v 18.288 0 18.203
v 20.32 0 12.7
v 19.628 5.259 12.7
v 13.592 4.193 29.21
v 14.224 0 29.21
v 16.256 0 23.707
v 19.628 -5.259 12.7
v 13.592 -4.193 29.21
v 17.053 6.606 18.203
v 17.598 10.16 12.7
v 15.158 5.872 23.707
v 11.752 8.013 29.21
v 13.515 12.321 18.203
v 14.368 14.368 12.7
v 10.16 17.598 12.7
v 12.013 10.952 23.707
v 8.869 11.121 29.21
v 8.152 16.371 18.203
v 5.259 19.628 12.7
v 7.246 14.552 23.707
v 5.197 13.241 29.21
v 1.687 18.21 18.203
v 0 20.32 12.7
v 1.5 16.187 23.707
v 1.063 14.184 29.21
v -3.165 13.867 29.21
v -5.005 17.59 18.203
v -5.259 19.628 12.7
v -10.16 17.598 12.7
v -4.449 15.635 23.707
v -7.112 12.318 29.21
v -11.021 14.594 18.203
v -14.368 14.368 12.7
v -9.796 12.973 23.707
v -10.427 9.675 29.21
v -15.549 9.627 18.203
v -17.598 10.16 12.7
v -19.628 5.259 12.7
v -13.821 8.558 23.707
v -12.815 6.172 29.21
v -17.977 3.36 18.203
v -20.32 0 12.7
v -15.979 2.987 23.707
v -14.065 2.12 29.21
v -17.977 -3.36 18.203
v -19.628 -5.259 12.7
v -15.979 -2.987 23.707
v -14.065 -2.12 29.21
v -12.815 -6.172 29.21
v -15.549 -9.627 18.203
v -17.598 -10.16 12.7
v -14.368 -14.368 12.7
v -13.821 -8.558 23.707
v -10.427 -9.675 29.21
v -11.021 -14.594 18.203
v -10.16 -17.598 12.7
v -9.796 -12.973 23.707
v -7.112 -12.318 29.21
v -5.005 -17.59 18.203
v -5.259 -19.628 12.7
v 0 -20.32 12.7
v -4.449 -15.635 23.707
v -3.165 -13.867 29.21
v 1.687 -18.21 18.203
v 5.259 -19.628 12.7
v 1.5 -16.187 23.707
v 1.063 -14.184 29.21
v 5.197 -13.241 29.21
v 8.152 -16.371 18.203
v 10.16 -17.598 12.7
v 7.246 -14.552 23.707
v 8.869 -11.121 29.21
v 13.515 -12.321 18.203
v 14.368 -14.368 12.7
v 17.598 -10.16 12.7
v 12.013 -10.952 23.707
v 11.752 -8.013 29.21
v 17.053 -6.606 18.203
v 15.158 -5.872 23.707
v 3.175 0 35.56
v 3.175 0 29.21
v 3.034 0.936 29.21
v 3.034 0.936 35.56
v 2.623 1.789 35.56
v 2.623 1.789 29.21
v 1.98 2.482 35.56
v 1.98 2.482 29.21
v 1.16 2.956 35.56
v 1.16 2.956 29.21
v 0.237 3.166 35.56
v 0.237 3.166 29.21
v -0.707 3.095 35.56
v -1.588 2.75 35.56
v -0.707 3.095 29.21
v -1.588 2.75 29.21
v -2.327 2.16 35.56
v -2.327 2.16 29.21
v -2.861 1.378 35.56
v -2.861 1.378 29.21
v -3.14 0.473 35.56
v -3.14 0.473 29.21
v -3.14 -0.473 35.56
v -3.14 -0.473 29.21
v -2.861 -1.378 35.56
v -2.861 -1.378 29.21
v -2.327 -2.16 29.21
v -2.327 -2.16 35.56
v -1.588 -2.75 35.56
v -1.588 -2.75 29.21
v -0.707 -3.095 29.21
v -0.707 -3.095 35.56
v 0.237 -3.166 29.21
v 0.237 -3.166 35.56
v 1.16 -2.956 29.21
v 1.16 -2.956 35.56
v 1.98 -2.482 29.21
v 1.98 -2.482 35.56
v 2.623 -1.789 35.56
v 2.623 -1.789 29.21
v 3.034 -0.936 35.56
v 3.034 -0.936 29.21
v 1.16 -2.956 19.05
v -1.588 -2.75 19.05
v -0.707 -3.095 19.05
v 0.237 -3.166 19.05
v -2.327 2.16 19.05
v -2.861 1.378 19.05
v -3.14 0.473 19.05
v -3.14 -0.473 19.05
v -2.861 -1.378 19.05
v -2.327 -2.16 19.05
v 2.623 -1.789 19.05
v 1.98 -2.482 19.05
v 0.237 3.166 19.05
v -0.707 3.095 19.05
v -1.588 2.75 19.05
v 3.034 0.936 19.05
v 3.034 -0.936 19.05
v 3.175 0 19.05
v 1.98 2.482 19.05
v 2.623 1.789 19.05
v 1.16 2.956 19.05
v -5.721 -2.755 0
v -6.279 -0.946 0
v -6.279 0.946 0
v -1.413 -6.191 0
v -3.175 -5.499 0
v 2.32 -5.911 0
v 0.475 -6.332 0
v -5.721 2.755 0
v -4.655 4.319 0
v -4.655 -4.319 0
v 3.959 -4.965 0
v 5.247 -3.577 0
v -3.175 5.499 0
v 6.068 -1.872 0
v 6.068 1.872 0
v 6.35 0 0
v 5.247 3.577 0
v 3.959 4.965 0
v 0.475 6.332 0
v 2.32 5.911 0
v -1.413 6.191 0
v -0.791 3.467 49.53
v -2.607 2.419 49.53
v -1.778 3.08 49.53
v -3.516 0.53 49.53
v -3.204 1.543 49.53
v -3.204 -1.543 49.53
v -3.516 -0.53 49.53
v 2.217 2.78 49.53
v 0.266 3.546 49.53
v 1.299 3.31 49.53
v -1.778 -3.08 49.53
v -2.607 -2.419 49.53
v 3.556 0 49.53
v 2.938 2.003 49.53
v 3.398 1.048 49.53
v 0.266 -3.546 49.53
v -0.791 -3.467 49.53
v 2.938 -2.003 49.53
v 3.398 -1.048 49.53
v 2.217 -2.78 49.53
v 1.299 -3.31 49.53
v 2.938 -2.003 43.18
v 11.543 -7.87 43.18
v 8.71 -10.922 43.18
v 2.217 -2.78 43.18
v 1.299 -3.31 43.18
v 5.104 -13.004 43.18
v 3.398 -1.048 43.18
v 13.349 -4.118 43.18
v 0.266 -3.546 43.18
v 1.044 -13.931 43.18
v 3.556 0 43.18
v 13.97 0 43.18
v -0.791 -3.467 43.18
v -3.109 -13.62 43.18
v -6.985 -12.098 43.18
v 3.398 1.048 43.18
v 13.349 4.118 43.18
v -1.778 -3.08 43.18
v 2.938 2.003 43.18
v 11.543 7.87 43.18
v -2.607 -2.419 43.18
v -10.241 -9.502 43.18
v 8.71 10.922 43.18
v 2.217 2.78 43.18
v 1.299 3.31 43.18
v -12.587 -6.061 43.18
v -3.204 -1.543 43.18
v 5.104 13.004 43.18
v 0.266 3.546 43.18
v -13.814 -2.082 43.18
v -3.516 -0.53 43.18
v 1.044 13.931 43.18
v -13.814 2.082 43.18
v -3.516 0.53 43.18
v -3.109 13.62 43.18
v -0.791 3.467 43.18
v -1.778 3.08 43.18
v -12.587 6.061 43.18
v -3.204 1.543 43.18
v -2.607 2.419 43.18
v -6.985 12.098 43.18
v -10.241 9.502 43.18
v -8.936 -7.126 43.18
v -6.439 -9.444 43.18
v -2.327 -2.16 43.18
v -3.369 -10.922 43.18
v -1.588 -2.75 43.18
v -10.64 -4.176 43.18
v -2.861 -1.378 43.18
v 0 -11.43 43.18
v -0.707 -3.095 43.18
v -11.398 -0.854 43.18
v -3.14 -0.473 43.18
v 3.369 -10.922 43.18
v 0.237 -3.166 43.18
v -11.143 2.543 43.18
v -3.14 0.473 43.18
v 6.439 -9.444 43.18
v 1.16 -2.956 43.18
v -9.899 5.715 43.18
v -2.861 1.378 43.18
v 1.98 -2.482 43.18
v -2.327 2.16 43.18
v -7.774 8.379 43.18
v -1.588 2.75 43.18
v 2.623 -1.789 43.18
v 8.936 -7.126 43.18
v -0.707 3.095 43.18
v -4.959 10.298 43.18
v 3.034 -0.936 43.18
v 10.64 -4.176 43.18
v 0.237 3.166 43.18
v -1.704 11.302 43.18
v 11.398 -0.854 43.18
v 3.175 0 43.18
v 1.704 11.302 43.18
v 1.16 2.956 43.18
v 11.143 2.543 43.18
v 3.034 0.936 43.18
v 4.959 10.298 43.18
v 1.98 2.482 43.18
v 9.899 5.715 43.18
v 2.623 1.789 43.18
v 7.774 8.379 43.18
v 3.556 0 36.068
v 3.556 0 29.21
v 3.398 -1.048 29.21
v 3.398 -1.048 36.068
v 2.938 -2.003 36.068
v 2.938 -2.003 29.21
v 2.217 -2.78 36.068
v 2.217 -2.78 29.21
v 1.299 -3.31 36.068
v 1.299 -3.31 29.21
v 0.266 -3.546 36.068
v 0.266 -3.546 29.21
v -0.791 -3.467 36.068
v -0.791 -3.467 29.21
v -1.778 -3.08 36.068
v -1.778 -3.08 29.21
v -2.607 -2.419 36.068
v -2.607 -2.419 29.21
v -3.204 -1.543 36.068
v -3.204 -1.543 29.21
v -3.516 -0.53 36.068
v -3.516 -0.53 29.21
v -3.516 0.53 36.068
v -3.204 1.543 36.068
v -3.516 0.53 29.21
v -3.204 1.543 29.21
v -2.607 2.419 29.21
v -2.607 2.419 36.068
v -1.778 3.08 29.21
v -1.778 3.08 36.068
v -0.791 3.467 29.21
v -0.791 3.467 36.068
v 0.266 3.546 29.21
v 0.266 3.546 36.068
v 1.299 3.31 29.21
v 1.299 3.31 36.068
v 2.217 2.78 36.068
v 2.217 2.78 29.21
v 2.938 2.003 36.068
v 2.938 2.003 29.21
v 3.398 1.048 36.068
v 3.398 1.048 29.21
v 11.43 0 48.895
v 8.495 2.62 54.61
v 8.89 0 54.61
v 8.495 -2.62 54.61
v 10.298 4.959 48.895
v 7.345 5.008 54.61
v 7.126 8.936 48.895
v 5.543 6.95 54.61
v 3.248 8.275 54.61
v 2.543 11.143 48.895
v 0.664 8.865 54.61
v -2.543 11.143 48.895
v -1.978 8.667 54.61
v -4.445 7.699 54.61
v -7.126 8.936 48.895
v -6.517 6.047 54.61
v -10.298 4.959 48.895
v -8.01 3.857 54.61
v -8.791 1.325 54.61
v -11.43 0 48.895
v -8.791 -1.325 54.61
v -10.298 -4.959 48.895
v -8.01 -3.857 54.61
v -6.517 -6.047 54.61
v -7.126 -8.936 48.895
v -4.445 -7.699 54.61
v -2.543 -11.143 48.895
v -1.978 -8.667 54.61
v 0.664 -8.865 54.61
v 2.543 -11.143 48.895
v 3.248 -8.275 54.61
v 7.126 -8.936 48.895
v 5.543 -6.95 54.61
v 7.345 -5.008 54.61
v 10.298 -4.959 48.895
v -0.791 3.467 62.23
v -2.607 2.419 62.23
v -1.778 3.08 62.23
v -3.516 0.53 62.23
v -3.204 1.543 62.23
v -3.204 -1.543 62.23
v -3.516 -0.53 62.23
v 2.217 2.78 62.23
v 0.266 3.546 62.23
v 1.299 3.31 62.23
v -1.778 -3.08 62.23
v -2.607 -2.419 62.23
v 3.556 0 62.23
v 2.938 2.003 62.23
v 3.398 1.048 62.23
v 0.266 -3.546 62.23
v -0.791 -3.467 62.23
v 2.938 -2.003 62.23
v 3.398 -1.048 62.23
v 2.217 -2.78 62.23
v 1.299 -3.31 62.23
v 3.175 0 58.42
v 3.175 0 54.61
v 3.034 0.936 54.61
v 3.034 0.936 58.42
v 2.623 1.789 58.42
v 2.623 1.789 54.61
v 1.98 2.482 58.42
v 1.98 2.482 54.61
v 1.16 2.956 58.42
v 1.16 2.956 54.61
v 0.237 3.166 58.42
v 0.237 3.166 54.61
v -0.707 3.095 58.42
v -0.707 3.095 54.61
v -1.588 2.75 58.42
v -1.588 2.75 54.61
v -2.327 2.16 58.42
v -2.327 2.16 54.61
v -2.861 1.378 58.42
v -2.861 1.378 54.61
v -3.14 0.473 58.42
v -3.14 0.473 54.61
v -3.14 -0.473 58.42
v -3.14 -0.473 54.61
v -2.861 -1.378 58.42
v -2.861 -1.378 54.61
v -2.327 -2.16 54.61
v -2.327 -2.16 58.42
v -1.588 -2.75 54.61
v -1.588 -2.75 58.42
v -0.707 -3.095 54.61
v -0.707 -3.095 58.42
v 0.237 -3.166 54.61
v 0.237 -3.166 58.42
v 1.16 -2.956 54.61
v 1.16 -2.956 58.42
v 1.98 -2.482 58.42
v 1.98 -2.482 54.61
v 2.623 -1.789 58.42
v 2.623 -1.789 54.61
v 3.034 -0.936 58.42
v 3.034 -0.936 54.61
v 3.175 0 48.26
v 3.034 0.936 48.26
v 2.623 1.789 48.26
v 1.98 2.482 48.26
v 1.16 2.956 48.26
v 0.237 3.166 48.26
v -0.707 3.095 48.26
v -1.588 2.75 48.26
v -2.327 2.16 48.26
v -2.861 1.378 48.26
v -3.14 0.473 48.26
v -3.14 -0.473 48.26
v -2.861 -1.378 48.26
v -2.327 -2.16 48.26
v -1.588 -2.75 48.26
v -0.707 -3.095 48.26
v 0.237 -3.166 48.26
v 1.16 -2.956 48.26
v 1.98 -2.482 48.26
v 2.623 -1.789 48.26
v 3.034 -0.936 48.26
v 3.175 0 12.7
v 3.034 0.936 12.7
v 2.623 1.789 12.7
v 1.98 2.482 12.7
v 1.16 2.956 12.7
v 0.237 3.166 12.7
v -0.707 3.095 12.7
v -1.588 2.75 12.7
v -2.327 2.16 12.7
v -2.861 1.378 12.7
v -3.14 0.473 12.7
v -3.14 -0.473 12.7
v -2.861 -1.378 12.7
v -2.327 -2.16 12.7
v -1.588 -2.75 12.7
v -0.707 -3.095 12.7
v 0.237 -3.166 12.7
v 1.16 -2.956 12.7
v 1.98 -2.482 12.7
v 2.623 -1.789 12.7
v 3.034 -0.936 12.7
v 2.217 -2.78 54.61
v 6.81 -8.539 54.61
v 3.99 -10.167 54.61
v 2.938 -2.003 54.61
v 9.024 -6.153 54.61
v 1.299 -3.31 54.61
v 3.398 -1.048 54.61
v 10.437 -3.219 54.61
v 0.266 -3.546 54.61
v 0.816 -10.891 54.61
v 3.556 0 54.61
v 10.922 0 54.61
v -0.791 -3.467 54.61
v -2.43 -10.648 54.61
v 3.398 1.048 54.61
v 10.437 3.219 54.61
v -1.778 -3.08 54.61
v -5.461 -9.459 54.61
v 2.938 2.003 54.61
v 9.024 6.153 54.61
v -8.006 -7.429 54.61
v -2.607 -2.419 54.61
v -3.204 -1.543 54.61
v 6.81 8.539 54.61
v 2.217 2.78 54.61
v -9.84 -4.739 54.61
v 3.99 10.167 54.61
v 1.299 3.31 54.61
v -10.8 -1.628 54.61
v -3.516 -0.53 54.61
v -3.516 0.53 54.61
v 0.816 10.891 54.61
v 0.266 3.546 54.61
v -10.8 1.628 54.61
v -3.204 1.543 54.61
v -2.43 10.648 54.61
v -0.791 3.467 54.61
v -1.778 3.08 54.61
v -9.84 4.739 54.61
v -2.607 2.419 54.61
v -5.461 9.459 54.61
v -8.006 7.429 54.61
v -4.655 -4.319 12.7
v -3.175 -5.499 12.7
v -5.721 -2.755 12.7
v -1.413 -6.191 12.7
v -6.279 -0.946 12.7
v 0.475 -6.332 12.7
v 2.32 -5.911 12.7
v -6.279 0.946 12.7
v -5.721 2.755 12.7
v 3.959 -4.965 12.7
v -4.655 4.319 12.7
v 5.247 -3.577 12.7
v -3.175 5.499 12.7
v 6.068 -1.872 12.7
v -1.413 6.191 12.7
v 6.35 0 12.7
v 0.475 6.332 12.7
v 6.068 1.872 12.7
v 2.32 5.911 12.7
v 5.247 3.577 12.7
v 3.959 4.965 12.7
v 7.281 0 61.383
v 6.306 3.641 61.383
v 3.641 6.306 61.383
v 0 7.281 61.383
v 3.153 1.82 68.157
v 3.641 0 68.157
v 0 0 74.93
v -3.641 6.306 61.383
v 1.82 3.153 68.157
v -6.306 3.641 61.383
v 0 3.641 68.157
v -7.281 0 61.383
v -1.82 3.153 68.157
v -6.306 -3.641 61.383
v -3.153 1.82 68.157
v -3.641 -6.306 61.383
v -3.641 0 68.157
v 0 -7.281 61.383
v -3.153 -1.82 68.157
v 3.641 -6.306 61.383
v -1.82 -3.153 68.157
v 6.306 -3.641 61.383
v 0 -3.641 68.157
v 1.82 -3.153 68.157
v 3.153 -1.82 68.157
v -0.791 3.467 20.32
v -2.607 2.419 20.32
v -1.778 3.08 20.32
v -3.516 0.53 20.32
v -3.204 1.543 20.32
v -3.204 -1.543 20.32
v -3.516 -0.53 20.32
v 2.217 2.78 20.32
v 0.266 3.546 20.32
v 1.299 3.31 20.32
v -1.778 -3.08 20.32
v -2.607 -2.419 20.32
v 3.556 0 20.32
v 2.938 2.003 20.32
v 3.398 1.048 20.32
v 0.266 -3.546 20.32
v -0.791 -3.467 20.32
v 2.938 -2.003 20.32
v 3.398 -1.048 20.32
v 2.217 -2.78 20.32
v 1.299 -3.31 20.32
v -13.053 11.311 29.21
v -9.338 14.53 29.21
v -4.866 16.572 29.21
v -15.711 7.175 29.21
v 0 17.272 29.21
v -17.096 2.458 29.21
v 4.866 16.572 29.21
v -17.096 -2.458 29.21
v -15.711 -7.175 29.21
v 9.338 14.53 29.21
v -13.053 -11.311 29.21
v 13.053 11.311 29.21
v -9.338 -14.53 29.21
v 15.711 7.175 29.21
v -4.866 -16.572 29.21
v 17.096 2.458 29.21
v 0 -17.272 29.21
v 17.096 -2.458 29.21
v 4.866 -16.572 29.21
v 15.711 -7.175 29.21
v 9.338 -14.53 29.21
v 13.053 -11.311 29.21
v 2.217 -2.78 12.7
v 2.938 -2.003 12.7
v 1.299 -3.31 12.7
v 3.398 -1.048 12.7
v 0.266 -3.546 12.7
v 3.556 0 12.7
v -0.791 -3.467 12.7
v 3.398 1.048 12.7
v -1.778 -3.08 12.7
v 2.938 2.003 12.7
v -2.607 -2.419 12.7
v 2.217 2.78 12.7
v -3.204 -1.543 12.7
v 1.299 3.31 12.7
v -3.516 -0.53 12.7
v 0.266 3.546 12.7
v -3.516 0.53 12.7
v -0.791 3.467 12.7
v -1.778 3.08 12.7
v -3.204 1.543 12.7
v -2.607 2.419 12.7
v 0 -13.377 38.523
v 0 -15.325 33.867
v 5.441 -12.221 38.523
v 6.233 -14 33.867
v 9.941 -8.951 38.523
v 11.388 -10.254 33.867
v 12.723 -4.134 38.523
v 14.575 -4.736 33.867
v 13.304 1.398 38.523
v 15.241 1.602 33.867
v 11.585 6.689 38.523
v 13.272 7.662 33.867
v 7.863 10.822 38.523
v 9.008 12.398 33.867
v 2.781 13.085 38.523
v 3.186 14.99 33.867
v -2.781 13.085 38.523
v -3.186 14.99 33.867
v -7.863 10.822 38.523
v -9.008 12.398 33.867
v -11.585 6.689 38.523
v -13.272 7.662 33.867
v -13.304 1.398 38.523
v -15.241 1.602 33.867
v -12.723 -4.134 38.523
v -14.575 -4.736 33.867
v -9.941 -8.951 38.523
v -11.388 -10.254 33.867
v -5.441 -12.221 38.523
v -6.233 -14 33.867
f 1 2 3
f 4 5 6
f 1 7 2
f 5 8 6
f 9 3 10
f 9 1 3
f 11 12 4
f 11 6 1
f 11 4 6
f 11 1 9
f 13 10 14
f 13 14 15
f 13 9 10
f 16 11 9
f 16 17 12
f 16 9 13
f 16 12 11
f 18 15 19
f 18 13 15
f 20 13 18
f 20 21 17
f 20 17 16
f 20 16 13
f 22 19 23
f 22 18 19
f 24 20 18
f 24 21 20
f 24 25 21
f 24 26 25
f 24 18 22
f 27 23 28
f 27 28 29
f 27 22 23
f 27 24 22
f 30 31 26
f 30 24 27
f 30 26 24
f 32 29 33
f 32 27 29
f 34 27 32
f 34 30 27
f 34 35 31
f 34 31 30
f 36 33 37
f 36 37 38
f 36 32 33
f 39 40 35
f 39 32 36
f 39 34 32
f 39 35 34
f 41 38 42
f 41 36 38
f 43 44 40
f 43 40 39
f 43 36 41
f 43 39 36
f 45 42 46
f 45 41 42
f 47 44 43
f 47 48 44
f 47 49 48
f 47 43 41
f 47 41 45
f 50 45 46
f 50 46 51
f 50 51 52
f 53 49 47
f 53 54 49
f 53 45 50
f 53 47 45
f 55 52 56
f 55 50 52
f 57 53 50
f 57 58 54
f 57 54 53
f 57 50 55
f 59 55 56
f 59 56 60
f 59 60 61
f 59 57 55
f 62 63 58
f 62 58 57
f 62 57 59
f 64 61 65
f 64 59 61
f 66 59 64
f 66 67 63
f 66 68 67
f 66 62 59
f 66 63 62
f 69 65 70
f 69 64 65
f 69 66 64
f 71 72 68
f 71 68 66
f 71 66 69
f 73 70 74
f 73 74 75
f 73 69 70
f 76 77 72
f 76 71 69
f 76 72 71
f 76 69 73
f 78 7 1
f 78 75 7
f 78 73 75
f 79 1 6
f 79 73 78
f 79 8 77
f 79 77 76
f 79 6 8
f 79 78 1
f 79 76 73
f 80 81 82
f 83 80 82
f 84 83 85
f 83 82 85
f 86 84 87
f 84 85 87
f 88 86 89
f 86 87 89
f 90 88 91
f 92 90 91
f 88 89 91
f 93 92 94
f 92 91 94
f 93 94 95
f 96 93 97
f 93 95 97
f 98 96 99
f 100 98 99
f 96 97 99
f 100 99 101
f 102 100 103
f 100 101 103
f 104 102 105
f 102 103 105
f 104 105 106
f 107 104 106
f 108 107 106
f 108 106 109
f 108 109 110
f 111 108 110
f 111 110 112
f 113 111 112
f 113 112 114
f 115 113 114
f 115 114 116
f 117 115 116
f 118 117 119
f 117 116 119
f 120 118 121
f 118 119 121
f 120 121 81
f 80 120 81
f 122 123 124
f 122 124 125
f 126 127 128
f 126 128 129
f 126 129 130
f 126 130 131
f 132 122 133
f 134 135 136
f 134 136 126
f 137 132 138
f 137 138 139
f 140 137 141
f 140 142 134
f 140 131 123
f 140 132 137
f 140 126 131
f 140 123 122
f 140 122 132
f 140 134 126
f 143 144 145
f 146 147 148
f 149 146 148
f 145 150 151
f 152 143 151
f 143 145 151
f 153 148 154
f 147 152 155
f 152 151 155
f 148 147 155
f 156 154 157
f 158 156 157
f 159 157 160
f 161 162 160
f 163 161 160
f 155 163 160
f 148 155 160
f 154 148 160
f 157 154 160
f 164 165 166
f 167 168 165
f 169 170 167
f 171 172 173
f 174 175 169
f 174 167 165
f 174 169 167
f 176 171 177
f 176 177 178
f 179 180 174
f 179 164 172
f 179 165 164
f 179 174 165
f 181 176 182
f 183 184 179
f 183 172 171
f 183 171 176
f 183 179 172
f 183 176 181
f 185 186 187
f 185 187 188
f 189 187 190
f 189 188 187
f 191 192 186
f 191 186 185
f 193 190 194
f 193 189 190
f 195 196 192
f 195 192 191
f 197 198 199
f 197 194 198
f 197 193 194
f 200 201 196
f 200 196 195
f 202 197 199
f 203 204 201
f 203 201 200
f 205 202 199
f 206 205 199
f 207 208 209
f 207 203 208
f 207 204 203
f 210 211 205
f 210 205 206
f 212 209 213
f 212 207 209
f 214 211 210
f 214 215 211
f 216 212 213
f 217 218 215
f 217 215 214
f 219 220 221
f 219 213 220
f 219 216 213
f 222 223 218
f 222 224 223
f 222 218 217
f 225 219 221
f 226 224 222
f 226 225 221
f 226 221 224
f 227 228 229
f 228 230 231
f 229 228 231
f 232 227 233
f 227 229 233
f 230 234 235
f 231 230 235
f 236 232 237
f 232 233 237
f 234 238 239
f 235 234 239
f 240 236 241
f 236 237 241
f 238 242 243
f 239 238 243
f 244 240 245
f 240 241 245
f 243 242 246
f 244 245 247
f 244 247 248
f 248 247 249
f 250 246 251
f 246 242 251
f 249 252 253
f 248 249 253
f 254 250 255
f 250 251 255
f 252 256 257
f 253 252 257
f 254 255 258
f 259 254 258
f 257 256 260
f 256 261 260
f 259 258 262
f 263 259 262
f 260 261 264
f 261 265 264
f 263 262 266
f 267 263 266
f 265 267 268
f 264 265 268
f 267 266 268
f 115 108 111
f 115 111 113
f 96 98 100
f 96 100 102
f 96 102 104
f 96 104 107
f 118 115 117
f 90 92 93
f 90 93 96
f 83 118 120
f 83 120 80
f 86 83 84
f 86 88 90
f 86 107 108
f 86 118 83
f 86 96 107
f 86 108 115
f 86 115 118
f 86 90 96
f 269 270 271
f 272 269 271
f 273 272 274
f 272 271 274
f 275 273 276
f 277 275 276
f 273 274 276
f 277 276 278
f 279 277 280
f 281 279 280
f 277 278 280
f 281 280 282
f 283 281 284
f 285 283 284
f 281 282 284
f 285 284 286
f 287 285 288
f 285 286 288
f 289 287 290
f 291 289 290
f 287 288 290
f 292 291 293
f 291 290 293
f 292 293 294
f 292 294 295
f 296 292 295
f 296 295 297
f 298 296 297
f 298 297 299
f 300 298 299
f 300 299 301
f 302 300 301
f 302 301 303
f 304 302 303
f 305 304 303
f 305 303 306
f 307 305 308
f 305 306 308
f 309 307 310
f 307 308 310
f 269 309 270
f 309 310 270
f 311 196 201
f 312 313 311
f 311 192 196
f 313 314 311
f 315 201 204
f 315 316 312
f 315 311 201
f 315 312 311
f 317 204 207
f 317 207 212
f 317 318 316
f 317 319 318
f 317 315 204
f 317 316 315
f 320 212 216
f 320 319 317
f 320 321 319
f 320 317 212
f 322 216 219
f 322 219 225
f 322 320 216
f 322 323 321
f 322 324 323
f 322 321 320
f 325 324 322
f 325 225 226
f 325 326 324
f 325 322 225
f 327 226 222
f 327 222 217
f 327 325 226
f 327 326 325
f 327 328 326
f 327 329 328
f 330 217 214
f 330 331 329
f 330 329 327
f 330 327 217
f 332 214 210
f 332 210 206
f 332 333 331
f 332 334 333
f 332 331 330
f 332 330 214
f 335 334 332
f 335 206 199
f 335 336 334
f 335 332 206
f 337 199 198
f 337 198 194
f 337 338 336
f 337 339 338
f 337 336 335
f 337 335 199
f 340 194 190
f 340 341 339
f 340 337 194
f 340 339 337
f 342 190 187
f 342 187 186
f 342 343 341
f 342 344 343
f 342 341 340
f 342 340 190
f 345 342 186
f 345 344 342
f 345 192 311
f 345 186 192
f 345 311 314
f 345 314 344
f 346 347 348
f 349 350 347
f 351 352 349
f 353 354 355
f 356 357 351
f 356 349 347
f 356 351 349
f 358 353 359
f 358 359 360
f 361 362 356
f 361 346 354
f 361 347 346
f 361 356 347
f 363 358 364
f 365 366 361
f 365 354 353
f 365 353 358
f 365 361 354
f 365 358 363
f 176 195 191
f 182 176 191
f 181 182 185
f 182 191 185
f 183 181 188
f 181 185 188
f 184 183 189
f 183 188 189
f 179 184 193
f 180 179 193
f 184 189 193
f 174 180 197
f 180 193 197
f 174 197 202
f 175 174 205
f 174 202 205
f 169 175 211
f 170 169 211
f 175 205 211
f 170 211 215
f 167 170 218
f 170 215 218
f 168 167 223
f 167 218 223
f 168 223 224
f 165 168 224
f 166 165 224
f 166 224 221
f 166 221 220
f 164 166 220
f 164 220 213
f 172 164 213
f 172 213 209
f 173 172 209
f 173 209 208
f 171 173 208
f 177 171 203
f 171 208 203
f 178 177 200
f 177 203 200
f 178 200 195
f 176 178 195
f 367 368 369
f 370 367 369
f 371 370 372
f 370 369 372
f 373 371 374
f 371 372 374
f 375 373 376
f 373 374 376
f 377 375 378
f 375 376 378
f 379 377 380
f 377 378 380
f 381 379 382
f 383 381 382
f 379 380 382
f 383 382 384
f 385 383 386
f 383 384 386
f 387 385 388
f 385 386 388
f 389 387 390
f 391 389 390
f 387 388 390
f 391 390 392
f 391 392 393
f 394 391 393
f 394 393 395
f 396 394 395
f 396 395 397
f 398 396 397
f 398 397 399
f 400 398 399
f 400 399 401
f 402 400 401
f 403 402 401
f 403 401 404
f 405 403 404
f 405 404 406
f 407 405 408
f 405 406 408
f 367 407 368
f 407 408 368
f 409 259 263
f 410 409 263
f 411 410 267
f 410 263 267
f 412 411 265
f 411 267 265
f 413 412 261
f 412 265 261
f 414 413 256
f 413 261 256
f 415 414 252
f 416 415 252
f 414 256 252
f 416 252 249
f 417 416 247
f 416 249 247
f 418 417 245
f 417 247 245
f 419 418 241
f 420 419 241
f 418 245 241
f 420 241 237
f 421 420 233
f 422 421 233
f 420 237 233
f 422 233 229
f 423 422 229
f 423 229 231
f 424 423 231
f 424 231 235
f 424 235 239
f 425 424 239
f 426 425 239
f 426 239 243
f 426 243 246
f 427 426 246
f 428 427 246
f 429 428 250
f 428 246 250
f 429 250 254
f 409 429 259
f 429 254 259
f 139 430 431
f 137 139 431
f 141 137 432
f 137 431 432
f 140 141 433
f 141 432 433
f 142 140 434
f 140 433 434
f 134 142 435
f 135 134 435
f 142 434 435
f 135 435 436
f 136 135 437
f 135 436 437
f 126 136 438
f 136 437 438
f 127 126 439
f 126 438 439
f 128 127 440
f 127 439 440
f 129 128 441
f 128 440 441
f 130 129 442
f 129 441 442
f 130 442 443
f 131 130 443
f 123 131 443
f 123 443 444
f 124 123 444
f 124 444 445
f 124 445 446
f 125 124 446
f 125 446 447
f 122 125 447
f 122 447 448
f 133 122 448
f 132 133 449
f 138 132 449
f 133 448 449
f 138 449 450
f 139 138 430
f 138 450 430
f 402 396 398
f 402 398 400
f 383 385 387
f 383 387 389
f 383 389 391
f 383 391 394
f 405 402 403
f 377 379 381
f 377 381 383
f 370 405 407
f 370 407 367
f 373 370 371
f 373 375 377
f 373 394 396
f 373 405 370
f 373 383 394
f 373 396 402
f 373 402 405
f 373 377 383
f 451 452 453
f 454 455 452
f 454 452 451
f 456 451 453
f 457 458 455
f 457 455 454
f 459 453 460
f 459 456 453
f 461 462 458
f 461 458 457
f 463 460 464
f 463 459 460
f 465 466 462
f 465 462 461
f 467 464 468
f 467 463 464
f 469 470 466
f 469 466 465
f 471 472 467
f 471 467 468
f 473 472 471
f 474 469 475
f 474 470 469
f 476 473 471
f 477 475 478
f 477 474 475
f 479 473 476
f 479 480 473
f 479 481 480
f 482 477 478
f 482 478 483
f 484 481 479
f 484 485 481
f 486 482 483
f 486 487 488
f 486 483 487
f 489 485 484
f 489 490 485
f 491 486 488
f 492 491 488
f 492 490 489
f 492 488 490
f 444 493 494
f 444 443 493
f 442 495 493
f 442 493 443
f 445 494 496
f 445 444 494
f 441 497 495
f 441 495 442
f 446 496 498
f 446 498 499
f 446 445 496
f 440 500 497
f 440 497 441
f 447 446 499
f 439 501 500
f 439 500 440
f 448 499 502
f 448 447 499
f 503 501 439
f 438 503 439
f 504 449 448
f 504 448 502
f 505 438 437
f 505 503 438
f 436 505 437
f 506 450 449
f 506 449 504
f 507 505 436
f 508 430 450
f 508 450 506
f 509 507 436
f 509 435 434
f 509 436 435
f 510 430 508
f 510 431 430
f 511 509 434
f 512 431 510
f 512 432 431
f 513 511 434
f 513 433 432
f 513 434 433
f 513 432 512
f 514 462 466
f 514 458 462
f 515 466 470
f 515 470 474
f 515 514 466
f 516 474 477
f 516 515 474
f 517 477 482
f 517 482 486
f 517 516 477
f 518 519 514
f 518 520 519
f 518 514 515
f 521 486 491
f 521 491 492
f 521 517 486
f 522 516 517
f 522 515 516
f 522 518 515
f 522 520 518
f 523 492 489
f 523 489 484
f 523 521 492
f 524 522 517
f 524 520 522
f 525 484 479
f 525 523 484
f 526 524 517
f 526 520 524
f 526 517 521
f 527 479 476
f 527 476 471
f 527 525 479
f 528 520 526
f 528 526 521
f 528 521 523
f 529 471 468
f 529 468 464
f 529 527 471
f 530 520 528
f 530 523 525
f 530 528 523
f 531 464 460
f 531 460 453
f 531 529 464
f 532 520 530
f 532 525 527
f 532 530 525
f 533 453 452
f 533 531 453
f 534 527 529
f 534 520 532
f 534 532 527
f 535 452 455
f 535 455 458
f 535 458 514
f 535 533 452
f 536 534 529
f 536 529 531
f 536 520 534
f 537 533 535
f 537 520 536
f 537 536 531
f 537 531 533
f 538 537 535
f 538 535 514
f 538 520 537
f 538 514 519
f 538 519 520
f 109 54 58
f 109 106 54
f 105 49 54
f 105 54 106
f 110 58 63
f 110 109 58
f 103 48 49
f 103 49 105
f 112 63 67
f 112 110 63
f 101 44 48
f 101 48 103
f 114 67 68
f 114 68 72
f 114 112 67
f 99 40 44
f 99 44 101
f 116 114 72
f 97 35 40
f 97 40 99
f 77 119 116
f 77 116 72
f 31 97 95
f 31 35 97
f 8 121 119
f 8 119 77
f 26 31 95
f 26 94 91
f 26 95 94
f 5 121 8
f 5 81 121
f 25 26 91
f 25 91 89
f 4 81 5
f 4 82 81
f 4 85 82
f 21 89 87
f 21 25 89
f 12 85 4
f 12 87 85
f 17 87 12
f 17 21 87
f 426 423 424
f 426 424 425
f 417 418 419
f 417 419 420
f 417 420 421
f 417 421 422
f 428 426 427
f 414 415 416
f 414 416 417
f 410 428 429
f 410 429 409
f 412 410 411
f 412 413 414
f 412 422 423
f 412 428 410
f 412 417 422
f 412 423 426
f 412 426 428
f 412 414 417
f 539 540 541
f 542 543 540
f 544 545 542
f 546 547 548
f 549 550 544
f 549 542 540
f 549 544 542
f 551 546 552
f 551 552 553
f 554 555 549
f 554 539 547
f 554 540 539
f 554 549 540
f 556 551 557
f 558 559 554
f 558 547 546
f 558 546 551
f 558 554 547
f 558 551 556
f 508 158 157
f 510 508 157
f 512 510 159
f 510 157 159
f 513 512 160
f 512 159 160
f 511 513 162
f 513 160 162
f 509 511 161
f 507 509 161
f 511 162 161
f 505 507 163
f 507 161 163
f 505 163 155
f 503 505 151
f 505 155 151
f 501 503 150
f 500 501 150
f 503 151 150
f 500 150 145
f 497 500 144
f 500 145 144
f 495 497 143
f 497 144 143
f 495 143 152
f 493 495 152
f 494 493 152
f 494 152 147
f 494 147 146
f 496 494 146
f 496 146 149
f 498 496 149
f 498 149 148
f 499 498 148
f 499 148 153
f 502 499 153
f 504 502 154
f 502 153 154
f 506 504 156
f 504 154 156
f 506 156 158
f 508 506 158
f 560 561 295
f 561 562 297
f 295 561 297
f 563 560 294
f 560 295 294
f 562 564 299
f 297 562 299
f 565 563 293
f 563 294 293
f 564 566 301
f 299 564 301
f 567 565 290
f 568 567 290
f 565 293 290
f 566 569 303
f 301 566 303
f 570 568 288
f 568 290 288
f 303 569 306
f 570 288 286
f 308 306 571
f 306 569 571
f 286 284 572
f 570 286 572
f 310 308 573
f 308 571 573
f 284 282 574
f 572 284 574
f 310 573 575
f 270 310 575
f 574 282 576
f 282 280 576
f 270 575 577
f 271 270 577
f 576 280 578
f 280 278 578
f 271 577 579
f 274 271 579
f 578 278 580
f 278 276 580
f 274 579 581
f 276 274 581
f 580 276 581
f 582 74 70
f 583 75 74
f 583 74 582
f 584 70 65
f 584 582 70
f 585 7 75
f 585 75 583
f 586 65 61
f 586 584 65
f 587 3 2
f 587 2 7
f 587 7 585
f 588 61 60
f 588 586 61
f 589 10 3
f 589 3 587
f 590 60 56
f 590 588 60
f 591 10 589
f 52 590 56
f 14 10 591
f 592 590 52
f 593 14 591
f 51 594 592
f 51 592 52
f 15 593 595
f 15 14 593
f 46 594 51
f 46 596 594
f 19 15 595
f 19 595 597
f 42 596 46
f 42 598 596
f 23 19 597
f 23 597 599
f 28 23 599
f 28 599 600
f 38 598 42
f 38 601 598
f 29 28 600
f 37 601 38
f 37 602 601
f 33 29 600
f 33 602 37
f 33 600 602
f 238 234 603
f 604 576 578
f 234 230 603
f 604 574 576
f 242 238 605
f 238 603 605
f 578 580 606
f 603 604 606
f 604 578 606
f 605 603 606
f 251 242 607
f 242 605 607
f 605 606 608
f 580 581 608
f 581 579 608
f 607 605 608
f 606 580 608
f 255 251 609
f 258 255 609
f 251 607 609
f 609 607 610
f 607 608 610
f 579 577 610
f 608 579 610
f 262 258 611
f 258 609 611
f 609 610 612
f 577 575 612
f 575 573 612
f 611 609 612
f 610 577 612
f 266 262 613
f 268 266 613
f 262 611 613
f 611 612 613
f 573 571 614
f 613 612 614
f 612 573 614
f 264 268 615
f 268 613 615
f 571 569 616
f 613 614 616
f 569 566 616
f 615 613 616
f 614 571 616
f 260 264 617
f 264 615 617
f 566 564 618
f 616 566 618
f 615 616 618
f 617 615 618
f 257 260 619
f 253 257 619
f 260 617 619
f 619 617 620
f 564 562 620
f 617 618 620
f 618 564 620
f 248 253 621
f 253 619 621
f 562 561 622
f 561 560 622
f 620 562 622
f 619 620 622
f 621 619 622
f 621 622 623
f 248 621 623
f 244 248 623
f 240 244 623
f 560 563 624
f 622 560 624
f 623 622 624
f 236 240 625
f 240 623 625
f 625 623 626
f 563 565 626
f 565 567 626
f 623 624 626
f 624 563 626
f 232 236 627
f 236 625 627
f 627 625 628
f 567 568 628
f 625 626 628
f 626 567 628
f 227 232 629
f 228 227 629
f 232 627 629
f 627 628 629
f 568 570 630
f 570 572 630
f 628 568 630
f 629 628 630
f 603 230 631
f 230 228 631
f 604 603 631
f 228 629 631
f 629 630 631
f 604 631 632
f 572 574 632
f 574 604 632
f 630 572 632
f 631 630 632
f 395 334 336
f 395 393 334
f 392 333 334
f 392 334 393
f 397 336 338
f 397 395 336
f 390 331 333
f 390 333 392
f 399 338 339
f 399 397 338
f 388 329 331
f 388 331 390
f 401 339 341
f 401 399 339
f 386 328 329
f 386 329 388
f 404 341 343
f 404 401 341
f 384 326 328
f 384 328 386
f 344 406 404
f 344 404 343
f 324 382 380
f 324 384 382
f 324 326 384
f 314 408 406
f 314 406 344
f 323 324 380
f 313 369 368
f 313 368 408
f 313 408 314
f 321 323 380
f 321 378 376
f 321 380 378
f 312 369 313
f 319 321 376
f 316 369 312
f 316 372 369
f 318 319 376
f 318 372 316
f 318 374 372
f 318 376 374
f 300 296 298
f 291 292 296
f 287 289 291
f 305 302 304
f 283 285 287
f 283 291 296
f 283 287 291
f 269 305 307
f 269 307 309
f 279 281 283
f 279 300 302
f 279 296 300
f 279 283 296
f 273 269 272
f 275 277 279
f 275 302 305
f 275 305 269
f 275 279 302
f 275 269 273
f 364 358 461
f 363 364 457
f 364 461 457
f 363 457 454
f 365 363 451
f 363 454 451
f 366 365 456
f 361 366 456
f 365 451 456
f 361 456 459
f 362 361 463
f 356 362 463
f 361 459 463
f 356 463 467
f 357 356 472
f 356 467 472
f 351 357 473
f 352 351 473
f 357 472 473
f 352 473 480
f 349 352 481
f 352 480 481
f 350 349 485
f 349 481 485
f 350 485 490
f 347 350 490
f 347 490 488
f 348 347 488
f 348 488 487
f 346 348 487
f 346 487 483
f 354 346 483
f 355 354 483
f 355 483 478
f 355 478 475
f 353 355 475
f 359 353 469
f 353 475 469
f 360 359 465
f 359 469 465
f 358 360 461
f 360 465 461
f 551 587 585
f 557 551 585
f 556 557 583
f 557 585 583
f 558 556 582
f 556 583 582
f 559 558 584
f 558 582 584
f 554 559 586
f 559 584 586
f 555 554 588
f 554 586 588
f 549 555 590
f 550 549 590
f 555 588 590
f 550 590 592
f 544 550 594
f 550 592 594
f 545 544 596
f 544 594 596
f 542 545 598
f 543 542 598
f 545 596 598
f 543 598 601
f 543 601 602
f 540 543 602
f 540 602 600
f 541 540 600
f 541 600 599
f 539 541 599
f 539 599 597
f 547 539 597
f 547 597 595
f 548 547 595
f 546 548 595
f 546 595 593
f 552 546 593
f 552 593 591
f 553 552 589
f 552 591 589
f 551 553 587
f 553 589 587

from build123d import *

# Parameters (mm, degrees)
F0_R      = 6.35
F1_DEPTH  = 12.7
F2_R      = 3.175
F3_DEPTH  = 6.35
F6_R      = 3.556
F7_DEPTH  = 7.62
F8_R      = 3.175
F9_DEPTH  = 6.35
F12_R     = 3.556
F13_DEPTH = 6.858
F14_R     = 3.175
F15_DEPTH = 5.08
F18_R     = 3.556
F19_DEPTH = 6.35
F20_R     = 3.175
F21_DEPTH = 3.81
F24_R     = 3.556
F25_DEPTH = 7.62


with BuildPart() as f1:
    # F0 (on Top) → F1 (new body)
    with BuildSketch(Plane.XY):
        Circle(F0_R)
    extrude(amount=F1_DEPTH)

    # F2 (on face) → F3 (join)
    with BuildSketch(Plane.XY.offset(12.7)):
        Circle(F2_R)
    extrude(amount=F3_DEPTH)


with BuildPart() as f5:
    # F4 (on Front) → F5 (revolve)
    with BuildSketch(Plane.XZ):
        Polygon((0, 29.21), (0, 12.7), (20.32, 12.7), (14.224, 29.21), align=None)
    revolve(axis=Axis((0, 0, 20.955), (0, 0, 1)))

    # F6 (on face) → F7 (cut)
    with BuildSketch(Plane(origin=(0, 0, 12.7), x_dir=(1, 0, 0), z_dir=(0, 0, -1))):
        Circle(F6_R)
    extrude(amount=-F7_DEPTH, mode=Mode.SUBTRACT)

    # F8 (on face) → F9 (join)
    with BuildSketch(Plane.XY.offset(29.21)):
        Circle(F8_R)
    extrude(amount=F9_DEPTH)


with BuildPart() as f11:
    # F10 (on Right) → F11 (revolve)
    with BuildSketch(Plane.YZ):
        Polygon((0, 29.21), (0, 43.18), (-11.43, 43.18), (-17.272, 29.21), align=None)
    revolve(axis=Axis((0, 0, 36.195), (0, 0, 1)))

    # F12 (on face) → F13 (cut)
    with BuildSketch(Plane(origin=(0, 0, 29.21), x_dir=(1, 0, 0), z_dir=(0, 0, -1))):
        Circle(F12_R)
    extrude(amount=-F13_DEPTH, mode=Mode.SUBTRACT)

    # F14 (on face) → F15 (join)
    with BuildSketch(Plane.XY.offset(43.18)):
        Circle(F14_R)
    extrude(amount=F15_DEPTH)


with BuildPart() as f17:
    # F16 (on Front) → F17 (revolve)
    with BuildSketch(Plane.XZ):
        Polygon((8.89, 54.61), (0, 54.61), (0, 43.18), (13.97, 43.18), align=None)
    revolve(axis=Axis((0, 0, 48.895), (0, 0, 1)))

    # F18 (on face) → F19 (cut)
    with BuildSketch(Plane(origin=(0, 0, 43.18), x_dir=(1, 0, 0), z_dir=(0, 0, -1))):
        Circle(F18_R)
    extrude(amount=-F19_DEPTH, mode=Mode.SUBTRACT)

    # F20 (on face) → F21 (join)
    with BuildSketch(Plane.XY.offset(54.61)):
        Circle(F20_R)
    extrude(amount=F21_DEPTH)


with BuildPart() as f23:
    # F22 (on Front) → F23 (revolve)
    with BuildSketch(Plane.XZ):
        Polygon((10.922, 54.61), (0, 74.93), (0, 54.61), align=None)
    revolve(axis=Axis((0, 0, 64.77), (0, 0, 1)))

    # F24 (on face) → F25 (cut)
    with BuildSketch(Plane(origin=(0, 0, 54.61), x_dir=(1, 0, 0), z_dir=(0, 0, -1))):
        Circle(F24_R)
    extrude(amount=-F25_DEPTH, mode=Mode.SUBTRACT)


solid = Compound([f1.part, f5.part, f11.part, f17.part, f23.part])
